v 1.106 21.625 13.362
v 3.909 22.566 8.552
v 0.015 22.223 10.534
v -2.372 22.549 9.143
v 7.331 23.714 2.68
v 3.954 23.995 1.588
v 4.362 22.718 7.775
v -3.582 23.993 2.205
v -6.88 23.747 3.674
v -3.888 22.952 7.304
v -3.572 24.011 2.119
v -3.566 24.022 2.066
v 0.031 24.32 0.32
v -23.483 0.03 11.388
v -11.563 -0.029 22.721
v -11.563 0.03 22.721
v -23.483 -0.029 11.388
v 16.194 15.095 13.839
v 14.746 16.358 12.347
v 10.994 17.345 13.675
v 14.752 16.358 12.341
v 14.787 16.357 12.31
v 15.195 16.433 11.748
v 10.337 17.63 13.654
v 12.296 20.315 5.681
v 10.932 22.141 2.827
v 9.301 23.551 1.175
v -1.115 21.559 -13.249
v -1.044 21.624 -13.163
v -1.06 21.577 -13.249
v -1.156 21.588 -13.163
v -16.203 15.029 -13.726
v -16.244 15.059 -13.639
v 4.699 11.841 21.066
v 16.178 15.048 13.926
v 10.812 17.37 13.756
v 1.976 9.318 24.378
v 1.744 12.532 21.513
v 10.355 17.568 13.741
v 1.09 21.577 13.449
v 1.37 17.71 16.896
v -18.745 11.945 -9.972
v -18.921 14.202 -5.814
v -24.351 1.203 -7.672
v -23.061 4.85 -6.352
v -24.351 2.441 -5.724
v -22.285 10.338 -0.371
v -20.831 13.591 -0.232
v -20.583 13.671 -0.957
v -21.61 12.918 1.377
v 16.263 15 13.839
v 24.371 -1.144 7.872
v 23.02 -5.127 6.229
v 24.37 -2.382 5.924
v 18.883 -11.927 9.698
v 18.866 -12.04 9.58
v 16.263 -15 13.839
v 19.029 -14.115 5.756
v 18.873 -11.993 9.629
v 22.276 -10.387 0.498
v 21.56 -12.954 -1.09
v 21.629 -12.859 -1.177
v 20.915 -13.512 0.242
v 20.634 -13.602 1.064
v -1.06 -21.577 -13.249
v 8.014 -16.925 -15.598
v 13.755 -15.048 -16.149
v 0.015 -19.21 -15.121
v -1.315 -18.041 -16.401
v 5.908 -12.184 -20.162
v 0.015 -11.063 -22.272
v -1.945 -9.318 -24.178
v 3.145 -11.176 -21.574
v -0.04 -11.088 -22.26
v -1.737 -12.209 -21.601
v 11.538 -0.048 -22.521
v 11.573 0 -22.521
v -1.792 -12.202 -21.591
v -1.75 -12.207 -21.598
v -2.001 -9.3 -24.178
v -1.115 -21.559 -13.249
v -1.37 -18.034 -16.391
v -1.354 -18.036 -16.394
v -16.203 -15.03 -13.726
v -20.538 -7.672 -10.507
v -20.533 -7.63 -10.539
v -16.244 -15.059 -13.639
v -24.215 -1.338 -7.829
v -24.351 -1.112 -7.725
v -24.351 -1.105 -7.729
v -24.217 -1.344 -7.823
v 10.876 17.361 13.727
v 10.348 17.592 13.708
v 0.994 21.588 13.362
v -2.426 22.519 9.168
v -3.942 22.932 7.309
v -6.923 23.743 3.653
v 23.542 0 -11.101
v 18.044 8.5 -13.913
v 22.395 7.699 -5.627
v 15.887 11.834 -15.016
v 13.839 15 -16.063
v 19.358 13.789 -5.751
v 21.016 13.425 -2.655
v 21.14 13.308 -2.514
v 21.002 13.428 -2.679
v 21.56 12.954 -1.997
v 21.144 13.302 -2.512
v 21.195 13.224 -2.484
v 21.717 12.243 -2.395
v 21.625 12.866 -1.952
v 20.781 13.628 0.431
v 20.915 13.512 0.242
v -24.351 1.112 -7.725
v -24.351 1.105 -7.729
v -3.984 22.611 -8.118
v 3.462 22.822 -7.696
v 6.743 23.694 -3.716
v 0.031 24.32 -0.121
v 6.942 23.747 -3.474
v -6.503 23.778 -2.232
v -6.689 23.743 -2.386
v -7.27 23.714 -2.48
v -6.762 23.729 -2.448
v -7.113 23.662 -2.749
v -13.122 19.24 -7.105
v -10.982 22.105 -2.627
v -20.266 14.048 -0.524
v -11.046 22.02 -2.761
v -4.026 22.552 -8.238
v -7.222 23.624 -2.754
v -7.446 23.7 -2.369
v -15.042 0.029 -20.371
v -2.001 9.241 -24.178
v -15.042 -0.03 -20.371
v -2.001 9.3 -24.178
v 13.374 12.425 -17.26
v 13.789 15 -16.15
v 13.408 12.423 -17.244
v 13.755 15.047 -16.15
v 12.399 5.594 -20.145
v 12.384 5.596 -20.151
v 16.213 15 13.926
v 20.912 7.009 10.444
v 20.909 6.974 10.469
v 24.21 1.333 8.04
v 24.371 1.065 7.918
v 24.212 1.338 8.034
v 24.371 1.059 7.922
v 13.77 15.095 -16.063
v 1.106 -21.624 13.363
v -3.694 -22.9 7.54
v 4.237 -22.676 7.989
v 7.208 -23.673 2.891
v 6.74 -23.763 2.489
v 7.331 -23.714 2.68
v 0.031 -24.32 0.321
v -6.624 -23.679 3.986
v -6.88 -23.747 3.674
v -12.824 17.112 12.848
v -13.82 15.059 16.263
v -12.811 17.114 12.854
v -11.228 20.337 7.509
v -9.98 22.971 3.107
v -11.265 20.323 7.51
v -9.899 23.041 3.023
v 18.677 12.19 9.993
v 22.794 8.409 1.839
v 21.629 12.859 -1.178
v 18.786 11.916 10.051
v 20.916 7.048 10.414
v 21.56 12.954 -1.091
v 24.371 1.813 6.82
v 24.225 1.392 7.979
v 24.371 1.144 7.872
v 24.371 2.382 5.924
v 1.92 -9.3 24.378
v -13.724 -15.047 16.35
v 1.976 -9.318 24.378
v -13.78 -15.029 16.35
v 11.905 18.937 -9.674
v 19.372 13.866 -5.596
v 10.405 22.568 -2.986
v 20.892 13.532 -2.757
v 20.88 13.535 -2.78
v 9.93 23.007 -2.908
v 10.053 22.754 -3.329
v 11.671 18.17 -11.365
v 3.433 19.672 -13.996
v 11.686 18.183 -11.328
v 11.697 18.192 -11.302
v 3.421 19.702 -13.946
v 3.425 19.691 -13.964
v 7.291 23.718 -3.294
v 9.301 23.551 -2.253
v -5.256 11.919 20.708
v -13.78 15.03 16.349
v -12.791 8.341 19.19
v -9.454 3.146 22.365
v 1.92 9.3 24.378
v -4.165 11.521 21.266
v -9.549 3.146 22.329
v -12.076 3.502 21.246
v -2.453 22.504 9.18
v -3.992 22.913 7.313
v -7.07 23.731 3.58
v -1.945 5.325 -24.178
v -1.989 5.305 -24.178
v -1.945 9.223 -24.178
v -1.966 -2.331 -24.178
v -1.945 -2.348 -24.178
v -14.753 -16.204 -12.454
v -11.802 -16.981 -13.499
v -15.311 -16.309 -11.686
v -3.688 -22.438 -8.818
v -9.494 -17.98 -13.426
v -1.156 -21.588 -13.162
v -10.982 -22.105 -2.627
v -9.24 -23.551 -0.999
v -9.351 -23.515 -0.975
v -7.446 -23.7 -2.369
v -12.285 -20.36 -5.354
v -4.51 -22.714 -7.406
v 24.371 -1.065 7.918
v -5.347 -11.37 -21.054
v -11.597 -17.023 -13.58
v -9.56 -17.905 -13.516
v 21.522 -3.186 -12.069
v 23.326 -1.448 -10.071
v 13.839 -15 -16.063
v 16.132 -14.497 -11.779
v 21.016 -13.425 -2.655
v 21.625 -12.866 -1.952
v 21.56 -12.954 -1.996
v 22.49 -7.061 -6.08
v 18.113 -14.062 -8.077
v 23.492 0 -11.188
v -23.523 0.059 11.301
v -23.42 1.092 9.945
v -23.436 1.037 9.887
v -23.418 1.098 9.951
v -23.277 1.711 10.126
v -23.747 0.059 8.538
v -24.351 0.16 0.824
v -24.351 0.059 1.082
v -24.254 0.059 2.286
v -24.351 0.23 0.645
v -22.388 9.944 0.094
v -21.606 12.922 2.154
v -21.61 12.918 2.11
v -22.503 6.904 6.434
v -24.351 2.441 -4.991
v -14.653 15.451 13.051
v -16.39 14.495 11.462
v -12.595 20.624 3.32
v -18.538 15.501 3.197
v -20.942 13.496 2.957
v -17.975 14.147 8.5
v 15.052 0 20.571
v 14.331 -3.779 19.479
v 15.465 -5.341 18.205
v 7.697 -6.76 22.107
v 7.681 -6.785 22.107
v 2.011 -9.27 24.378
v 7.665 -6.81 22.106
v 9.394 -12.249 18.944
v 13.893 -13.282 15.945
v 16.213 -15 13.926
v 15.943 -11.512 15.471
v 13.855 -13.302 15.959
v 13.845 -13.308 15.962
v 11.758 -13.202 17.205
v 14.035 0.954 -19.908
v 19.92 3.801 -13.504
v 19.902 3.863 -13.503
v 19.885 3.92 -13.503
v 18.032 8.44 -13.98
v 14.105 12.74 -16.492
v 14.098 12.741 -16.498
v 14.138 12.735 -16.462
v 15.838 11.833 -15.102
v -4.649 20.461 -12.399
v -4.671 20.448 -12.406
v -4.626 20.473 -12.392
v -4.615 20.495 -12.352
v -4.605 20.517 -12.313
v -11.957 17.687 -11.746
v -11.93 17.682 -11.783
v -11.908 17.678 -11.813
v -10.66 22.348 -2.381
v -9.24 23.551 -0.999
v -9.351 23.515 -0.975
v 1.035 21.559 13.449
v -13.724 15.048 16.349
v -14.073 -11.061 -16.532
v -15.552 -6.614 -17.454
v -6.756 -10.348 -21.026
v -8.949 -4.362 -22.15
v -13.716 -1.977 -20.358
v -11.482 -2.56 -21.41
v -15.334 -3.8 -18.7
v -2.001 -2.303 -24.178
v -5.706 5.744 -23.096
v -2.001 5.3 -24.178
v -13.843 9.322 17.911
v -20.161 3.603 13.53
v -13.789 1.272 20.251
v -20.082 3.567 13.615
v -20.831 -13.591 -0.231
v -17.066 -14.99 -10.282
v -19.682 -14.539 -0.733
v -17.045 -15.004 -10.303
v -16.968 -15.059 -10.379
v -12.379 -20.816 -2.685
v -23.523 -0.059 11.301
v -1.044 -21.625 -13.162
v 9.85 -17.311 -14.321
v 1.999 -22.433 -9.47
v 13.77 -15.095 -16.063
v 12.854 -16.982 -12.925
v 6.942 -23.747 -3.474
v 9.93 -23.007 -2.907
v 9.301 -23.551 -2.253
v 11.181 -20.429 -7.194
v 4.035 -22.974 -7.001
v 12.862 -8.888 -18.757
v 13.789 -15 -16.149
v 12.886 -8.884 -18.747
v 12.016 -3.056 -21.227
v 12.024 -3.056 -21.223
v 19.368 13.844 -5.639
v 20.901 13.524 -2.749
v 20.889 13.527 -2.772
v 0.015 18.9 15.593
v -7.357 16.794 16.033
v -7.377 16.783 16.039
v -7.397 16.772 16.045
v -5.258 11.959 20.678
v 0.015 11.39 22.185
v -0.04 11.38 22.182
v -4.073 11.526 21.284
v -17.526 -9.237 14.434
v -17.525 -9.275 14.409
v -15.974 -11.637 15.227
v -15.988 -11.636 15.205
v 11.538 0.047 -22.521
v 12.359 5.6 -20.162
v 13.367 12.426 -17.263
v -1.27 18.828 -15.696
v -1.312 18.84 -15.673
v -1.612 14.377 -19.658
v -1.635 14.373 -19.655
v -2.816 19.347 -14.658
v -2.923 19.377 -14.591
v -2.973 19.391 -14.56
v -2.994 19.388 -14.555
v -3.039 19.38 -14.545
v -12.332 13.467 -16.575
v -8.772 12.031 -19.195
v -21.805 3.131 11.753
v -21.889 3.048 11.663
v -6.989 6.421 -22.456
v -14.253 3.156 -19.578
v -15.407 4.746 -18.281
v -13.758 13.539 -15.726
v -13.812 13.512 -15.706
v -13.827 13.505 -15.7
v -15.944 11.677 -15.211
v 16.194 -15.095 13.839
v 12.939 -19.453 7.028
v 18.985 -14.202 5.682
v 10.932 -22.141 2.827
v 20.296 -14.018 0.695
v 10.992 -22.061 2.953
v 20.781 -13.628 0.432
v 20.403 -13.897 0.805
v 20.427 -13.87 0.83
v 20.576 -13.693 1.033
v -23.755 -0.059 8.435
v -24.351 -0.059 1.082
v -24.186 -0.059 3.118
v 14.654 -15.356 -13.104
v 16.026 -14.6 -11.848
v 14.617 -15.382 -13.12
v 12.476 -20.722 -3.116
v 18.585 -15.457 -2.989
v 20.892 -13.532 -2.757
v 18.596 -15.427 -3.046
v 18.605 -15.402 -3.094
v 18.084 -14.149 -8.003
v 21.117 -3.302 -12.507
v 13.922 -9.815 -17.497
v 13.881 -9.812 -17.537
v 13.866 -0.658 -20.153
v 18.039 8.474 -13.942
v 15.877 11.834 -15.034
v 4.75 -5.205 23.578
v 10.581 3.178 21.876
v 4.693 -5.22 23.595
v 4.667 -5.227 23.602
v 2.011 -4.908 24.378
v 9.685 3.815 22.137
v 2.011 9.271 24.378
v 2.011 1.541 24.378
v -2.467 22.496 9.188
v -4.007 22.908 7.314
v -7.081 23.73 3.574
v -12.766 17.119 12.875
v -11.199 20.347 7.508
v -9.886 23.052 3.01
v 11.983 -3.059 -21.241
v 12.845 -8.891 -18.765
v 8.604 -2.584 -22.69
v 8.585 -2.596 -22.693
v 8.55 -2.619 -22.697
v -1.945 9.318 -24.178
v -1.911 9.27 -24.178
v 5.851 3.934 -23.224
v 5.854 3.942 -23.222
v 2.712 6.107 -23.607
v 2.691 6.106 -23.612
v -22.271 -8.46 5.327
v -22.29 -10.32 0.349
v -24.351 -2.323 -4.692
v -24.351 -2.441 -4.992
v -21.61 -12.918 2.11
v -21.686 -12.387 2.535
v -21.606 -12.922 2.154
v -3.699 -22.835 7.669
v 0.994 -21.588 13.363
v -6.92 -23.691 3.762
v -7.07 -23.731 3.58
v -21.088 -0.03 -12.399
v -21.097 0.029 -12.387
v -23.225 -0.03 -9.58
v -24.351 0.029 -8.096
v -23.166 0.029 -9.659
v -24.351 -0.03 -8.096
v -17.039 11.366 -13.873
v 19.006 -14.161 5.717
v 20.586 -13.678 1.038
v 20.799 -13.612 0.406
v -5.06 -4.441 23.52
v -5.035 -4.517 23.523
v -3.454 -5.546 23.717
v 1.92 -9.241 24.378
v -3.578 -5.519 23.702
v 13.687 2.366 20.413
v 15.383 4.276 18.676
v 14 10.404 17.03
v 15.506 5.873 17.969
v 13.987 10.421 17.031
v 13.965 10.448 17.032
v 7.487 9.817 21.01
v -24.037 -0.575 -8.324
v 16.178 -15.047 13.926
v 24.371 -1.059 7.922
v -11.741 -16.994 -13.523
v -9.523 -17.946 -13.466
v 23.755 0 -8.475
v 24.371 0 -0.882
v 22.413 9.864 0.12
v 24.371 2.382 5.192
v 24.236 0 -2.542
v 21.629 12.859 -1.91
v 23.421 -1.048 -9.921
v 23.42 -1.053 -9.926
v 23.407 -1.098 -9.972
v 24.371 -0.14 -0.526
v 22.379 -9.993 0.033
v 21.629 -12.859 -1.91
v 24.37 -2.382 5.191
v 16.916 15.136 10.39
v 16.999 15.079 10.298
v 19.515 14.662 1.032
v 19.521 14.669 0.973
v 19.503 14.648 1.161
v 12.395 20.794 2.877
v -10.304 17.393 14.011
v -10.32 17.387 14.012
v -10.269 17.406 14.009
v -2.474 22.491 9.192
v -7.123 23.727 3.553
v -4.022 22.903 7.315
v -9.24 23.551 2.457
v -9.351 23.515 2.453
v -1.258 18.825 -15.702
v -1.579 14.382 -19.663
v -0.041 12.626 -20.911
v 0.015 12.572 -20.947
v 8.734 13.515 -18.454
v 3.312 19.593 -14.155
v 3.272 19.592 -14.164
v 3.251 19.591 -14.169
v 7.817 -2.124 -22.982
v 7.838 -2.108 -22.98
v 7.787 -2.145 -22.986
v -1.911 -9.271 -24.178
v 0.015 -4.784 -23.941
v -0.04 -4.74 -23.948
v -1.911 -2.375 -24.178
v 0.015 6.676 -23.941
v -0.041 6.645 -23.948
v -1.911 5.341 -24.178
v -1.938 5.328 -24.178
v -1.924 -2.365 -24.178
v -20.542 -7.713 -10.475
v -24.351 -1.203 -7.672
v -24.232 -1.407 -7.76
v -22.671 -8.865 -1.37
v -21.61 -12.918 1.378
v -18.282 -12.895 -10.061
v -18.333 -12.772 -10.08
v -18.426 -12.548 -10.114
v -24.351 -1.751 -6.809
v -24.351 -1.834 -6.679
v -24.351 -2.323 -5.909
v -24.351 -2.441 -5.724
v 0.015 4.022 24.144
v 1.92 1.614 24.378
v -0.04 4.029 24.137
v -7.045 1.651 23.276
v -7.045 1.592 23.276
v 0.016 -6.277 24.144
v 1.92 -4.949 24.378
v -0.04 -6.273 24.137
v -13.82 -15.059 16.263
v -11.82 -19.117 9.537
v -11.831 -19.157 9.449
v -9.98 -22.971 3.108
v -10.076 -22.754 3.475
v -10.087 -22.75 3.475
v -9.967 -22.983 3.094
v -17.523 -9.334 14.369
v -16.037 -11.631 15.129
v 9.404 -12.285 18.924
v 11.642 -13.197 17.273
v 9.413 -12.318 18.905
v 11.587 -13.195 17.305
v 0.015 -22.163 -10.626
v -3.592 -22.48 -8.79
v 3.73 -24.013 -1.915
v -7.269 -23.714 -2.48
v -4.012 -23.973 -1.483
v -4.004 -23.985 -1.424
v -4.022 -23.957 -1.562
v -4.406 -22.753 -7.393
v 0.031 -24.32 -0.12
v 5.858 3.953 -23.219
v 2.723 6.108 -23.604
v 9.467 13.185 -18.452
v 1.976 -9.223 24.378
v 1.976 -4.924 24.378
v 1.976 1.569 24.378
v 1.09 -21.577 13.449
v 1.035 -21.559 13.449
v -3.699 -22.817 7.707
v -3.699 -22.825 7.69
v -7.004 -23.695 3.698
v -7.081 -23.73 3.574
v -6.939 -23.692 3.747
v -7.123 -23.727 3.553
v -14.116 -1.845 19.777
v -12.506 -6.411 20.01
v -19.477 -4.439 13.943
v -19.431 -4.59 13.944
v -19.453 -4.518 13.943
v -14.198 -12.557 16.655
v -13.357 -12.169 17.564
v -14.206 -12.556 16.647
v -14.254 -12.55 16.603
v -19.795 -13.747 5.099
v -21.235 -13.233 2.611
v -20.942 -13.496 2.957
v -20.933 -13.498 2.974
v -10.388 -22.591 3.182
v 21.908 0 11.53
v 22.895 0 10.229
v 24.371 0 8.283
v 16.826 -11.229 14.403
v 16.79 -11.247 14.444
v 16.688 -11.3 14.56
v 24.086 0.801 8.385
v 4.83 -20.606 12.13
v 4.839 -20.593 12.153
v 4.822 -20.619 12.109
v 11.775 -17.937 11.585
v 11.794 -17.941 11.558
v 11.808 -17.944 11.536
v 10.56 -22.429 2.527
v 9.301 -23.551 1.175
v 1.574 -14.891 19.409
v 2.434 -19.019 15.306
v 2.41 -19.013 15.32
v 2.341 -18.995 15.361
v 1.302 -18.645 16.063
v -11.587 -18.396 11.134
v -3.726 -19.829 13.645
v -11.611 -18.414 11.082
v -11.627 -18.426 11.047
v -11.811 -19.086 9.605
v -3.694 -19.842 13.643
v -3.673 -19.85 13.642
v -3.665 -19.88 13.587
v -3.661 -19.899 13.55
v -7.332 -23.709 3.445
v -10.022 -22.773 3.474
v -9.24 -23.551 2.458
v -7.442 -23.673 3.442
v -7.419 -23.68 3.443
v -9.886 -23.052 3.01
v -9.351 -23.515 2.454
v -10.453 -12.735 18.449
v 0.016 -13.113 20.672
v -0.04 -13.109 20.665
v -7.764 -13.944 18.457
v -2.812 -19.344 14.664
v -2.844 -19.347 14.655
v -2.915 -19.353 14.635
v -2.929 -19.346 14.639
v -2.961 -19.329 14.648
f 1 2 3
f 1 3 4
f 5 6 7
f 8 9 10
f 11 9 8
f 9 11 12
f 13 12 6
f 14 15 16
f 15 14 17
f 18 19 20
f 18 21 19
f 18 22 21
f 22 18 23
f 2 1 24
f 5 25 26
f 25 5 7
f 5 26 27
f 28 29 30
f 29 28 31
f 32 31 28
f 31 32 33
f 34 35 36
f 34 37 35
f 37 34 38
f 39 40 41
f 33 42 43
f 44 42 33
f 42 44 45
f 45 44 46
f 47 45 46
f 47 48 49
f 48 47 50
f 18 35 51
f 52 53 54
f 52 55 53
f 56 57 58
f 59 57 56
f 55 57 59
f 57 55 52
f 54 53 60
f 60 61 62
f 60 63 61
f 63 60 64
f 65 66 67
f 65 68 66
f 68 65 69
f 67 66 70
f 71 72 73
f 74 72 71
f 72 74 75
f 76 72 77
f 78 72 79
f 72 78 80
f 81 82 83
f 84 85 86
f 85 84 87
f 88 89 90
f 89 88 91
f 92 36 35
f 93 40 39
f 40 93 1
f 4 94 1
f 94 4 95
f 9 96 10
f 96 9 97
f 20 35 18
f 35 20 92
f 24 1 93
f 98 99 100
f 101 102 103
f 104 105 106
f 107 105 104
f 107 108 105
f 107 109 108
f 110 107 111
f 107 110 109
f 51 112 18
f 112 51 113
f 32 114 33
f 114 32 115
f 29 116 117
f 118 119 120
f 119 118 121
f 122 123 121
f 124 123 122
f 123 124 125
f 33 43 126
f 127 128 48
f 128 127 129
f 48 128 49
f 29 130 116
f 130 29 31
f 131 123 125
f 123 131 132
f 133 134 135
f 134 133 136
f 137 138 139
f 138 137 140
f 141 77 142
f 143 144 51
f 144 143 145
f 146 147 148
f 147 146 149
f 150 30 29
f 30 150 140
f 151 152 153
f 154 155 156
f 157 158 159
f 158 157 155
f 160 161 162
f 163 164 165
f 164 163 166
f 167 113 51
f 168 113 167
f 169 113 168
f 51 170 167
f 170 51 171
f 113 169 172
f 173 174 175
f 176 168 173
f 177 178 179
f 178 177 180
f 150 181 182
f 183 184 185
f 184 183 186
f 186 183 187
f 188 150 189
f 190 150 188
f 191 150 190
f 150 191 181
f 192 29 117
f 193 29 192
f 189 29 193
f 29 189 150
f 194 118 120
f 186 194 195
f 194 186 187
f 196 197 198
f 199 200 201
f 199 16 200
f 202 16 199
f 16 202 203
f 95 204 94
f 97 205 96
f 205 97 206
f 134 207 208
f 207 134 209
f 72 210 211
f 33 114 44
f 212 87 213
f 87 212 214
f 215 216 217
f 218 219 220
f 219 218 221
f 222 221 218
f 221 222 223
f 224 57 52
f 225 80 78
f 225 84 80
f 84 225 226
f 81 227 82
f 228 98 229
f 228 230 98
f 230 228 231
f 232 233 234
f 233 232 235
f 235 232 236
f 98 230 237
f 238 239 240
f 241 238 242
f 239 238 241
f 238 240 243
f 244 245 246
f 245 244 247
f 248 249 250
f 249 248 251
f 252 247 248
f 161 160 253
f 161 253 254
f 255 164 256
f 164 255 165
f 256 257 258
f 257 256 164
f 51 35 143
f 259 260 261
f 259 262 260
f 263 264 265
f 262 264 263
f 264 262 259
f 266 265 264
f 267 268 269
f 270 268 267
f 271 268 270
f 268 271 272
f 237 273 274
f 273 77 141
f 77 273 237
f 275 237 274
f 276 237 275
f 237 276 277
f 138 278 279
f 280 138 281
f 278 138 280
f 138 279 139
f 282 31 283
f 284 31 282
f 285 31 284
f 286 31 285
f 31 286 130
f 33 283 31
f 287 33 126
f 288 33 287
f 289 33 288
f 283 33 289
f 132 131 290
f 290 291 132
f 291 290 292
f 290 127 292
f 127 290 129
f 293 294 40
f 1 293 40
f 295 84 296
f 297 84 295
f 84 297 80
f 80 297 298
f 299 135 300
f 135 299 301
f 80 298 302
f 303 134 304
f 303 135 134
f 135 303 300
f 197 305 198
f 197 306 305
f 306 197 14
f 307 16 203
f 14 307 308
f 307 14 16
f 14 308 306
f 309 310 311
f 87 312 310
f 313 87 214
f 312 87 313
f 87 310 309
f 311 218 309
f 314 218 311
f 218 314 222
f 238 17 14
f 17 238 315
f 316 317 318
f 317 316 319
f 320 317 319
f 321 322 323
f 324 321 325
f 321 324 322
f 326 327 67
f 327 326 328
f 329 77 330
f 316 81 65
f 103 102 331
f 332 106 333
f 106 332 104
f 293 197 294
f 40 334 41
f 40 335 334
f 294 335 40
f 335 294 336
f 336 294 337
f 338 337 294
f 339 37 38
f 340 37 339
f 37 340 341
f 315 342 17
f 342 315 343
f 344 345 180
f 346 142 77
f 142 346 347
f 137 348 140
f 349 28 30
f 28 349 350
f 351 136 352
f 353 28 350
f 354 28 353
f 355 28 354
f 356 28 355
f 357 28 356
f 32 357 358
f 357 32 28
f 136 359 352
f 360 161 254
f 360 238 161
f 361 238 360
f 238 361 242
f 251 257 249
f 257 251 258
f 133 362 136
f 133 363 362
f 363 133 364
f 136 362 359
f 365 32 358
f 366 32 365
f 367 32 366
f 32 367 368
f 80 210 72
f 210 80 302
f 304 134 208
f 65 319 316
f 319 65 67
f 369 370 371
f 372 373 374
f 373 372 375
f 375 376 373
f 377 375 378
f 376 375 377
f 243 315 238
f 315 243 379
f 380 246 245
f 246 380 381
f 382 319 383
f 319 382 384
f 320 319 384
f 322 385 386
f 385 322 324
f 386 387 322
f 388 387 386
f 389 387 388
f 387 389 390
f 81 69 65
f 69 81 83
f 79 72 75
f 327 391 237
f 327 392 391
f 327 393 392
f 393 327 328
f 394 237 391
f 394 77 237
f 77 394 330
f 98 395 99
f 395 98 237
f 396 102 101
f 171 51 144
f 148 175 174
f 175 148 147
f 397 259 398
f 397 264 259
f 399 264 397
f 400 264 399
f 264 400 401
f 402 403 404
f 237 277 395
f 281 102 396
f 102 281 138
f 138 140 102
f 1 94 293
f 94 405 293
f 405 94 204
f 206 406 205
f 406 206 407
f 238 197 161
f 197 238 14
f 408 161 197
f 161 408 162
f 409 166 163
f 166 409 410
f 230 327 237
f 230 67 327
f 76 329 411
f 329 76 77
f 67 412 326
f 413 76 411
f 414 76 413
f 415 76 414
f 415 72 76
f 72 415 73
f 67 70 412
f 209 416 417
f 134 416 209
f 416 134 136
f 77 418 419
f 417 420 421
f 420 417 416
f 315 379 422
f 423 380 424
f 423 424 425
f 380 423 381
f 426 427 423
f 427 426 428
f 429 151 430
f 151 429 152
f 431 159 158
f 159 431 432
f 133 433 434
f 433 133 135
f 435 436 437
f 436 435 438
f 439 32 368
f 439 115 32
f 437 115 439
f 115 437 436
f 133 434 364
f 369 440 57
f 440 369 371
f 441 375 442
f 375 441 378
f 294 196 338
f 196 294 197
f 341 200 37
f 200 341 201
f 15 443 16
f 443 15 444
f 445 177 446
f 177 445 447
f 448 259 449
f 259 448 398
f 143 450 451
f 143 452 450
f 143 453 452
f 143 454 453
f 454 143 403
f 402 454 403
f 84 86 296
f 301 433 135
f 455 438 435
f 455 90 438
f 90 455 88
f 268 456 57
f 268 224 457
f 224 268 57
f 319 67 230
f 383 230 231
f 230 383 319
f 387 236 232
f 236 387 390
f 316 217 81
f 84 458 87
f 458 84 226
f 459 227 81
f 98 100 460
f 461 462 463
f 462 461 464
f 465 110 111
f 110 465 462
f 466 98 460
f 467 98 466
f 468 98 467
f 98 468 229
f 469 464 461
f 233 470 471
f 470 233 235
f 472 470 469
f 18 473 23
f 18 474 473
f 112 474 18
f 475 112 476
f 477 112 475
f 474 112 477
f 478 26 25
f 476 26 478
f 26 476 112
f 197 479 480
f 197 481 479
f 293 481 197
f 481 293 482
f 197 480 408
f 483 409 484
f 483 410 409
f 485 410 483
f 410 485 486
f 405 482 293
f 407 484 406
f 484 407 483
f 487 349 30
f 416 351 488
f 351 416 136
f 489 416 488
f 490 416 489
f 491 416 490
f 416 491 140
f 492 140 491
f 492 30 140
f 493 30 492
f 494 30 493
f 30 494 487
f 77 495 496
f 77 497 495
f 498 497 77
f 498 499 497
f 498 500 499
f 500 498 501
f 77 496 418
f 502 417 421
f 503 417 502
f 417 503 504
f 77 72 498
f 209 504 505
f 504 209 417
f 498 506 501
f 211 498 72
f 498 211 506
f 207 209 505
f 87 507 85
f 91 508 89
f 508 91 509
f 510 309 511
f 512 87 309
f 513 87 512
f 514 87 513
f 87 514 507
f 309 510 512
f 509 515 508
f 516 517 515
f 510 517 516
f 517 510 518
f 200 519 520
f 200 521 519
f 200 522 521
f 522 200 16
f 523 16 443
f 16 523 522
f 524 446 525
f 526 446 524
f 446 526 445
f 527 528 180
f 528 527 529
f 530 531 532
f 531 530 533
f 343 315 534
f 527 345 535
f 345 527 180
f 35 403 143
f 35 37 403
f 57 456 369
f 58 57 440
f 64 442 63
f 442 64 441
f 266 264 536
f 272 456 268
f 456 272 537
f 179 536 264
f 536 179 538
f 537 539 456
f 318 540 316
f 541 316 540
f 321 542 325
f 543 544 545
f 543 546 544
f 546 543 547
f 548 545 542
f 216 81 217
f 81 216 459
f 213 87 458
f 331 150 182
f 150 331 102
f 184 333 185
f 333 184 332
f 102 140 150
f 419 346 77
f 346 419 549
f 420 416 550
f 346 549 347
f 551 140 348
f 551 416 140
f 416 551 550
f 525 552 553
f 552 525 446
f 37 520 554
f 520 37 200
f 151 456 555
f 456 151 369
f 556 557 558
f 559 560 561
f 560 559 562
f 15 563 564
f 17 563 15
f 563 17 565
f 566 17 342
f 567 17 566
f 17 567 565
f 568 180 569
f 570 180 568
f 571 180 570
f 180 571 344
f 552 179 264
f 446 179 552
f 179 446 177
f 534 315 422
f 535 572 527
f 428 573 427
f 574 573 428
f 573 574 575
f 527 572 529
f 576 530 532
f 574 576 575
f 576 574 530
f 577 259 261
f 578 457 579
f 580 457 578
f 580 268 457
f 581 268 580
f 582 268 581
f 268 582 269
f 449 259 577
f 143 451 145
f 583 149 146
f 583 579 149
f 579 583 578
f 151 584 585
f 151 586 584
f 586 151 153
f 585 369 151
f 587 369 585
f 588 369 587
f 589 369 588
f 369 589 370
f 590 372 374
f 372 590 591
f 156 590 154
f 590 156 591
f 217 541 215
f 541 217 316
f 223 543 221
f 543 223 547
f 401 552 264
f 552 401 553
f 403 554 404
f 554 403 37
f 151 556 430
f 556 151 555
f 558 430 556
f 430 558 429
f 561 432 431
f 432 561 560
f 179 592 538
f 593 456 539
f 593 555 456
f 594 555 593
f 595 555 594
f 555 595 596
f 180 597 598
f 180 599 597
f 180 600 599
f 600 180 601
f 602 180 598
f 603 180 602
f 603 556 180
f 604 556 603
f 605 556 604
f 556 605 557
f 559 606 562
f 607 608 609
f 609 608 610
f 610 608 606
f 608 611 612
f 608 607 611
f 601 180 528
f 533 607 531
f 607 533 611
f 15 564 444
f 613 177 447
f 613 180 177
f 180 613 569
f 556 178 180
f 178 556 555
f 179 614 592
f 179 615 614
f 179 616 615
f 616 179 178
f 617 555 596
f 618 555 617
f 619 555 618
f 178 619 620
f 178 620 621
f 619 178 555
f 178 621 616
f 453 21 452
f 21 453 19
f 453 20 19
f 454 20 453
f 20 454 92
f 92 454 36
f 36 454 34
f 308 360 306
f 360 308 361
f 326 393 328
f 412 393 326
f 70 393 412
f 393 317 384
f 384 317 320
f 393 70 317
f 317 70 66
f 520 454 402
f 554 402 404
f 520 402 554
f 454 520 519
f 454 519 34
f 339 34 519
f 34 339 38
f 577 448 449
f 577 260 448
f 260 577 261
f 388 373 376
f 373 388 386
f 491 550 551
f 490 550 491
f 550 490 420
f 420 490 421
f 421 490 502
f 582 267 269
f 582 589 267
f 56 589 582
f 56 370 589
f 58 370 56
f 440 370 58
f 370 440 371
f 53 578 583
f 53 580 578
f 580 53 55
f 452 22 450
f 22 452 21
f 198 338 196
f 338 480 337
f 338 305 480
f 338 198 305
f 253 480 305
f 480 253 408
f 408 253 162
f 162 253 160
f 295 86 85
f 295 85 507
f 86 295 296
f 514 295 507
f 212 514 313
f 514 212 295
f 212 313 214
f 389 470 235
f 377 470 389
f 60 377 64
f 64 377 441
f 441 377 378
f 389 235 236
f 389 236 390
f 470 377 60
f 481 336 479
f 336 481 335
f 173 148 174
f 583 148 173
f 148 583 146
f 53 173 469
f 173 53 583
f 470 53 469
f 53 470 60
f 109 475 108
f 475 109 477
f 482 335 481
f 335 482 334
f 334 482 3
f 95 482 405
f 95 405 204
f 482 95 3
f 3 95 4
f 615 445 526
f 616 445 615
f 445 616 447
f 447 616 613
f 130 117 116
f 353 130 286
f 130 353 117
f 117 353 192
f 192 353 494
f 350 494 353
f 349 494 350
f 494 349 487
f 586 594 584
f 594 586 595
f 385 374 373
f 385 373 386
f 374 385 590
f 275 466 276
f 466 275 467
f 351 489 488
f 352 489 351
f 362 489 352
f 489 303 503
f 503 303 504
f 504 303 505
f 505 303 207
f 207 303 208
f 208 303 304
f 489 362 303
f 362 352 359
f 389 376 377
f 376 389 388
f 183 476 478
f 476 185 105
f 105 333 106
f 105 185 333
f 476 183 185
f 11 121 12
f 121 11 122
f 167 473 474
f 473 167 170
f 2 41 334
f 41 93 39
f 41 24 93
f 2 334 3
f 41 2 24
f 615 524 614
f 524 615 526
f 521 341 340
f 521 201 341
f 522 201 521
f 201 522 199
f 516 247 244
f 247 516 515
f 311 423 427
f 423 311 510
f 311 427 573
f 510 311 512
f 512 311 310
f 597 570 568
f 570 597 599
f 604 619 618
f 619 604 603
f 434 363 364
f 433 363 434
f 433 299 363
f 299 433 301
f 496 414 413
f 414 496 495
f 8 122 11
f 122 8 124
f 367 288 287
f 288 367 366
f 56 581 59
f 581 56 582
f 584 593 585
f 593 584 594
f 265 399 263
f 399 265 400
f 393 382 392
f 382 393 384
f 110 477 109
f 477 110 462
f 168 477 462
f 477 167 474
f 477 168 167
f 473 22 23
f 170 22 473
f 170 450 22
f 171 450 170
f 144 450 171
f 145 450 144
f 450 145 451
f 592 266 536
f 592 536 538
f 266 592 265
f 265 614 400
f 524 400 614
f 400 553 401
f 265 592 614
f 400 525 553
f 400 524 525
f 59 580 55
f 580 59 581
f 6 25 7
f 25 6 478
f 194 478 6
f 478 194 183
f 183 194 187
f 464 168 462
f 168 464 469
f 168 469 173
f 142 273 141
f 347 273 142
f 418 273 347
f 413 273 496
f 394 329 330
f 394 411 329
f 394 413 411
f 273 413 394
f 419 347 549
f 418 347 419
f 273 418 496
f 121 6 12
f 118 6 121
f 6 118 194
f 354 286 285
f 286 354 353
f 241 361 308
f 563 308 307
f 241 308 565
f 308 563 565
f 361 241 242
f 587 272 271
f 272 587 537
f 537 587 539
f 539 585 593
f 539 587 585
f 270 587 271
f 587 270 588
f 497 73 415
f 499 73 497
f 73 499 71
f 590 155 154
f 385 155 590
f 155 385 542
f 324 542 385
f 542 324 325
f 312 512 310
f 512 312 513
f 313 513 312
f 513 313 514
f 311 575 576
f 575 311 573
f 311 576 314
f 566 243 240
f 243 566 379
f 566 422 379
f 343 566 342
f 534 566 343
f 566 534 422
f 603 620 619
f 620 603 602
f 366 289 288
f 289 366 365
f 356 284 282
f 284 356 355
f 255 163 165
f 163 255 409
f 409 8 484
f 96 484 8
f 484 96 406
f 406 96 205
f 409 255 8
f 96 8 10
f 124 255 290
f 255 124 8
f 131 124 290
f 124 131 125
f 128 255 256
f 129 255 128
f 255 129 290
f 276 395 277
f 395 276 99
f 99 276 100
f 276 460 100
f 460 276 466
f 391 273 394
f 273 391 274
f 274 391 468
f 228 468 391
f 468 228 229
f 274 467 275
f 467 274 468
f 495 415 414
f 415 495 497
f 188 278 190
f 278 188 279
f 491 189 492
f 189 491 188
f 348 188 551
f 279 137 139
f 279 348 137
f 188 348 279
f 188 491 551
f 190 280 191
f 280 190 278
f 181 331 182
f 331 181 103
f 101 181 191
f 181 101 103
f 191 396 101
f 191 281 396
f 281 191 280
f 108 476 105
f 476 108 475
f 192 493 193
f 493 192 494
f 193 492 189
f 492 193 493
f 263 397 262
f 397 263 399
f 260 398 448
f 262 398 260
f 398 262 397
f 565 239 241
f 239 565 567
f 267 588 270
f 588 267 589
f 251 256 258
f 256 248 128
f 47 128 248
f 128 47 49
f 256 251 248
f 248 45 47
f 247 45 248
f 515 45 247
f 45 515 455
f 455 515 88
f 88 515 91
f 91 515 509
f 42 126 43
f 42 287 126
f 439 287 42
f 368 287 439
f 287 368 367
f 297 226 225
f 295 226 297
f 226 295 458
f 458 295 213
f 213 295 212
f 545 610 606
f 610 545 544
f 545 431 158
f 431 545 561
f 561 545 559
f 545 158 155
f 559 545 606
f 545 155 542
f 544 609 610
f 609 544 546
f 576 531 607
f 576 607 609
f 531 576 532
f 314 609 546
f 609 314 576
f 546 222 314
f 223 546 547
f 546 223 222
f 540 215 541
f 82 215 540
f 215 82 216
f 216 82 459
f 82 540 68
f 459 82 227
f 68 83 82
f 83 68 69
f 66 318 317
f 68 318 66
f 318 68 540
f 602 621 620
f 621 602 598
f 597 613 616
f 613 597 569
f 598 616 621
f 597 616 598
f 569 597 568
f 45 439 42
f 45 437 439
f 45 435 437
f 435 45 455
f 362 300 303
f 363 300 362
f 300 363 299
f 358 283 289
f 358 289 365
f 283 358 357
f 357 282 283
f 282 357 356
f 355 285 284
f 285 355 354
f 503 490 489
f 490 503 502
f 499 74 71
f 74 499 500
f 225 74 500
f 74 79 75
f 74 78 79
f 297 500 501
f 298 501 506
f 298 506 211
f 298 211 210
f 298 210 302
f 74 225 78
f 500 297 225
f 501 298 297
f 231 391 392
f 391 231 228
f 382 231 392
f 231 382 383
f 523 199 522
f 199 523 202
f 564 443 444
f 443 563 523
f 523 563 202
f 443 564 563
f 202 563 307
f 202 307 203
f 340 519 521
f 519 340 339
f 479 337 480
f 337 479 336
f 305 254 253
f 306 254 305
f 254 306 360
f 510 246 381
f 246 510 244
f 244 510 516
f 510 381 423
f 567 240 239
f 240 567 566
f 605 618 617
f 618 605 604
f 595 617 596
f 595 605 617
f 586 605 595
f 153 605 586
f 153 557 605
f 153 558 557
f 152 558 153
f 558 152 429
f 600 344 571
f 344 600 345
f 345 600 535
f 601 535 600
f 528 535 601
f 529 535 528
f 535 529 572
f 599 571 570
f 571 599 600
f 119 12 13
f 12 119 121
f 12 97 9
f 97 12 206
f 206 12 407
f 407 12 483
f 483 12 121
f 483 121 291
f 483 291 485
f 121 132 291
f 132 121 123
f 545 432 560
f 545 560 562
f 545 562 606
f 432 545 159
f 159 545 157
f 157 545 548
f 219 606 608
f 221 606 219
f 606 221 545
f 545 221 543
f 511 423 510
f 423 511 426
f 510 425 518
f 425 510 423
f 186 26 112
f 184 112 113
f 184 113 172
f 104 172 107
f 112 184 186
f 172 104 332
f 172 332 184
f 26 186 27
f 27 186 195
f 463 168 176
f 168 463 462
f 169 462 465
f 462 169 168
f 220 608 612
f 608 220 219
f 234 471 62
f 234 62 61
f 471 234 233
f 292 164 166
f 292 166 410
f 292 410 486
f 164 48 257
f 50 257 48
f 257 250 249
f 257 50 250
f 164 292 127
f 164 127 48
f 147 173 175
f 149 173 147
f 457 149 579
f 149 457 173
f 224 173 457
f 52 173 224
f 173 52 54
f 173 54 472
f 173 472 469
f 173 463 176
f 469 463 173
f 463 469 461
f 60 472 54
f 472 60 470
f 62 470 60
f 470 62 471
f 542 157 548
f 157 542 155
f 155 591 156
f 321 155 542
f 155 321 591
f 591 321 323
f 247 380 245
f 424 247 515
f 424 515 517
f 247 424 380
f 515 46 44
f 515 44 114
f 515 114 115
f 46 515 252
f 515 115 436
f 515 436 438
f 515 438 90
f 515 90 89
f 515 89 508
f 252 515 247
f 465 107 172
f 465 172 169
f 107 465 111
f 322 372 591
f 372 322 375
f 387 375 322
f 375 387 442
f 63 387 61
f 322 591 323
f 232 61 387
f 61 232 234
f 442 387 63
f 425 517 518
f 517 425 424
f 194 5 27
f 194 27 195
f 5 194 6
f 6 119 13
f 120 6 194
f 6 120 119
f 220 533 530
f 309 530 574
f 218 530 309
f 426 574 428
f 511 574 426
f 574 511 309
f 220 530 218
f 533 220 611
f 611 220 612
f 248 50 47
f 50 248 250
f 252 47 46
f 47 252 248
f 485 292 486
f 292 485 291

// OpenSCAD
// Auto-generated OpenSCAD file

    shift = 0.1;

    inner_points = 10*[[5.706443019642959e-06, -0.2723516987986492, 2.5837617057555686], [1.4999954393425396, 1.0642537474213205, -1.8350415916407063], [-1.4999954393425396, -1.0642537474213205, 1.8350415916407063], [-5.706443019642959e-06, 0.2723516987986492, -2.5837617057555686], [0.9270536898503097, -2.3455753471556426, 0.6235765766532704], [1.4999987850420502, -1.8350374962478342, -1.0642560933519971], [-1.4999987850420502, 1.8350374962478342, 1.0642560933519971], [-0.9270536898503097, 2.3455753471556426, -0.6235765766532704], [2.4270527678798555, 0.2381872333395192, 0.8959250547901861], [-1.5000012149505249, -1.8350392457153057, -1.0642496520232227], [1.5000012149505249, 1.8350392457153057, 1.0642496520232227], [-2.4270527678798555, -0.2381872333395192, -0.8959250547901861], [4.962674139297185e-06, -1.7387961310994404, 1.8390700989324391], [1.330582852496041, -0.5531495795607023, -2.0806647086000423], [-1.330582852496041, 0.5531495795607023, 2.0806647086000423], [-4.962674139297185e-06, 1.7387961310994404, -1.8390700989324391], [2.1529364705869334, -1.285918487941708, 0.3418610979985478], [-1.6062511876135943e-07, -2.4225275722759347, -0.7327693879394935], [1.6062511876135943e-07, 2.4225275722759347, 0.7327693879394935], [-2.1529364705869334, 1.285918487941708, -0.3418610979985478], [1.330591142168375, 0.5531511314398159, 2.080658994767834], [2.1529335027574232, 1.2859209989348601, -0.3418703431732669], [-2.1529335027574232, -1.2859209989348601, 0.3418703431732669], [-1.330591142168375, -0.5531511314398159, -2.080658994767834], [1.5000045606500354, -1.0642519979538485, 1.8350351503119327], [2.427049198357815, -0.2381844026416876, -0.8959354770790755], [-0.9270482763947859, -2.345576428386003, 0.6235805576133857], [-3.638687006146668e-06, -1.519508833073842, -2.1073900697776224], [3.638687006146668e-06, 1.519508833073842, 2.1073900697776224], [0.9270482763947859, 2.345576428386003, -0.6235805576133857], [-2.427049198357815, 0.2381844026416876, 0.8959354770790755], [-1.5000045606500354, 1.0642519979538485, -1.8350351503119327]];

    outer_points_unshifted = 10*[[-0.19608520439314178, -0.9270801333840294, -2.4191058304470165], [0.19608700353766162, -0.9270218327319238, 2.4191280265173996], [-0.19608700353766162, 0.9270218327319238, -2.4191280265173996], [0.19608520439314178, 0.9270801333840294, 2.4191058304470165], [2.344218701663454, -1.1134433769019005e-05, -1.1201065478994996], [2.4940151556499304, 1.1134433769019005e-05, 0.7279343399404099], [-2.4940151556499304, -1.1134433769019005e-05, -0.7279343399404099], [-2.344218701663454, 1.1134433769019005e-05, 1.1201065478994996], [0.9240227990973536, -2.427050982949786, -0.0748691719653011], [0.9240180888758501, 2.427050982949786, -0.0749272820319791], [-0.9240180888758501, -2.427050982949786, 0.0749272820319791], [-0.9240227990973536, 2.427050982949786, 0.0748691719653011], [1.1522975479796653, -2.5858029875943017e-05, -2.253397695612072], [1.5001770417057199, 2.5858029875943017e-05, 2.0383963444847573], [-1.5001770417057199, -2.5858029875943017e-05, -2.0383963444847573], [-1.1522975479796653, 2.5858029875943017e-05, 2.253397695612072], [2.145898311350253, -1.33058699723953, -0.1739238179767419], [2.1458957290561314, 1.33058699723953, -0.17395567577440402], [-2.1458957290561314, -1.33058699723953, 0.17395567577440402], [-2.145898311350253, 1.33058699723953, 0.1739238179767419], [-0.10749858643607466, -2.152950967663567, -1.3262115212473227], [0.10750276467573276, -2.1529190053808764, 1.326263068246747], [-0.10750276467573276, 2.1529190053808764, -1.326263068246747], [0.10749858643607466, 2.152950967663567, 1.3262115212473227], [1.3739100632364183, -1.500018015784093, -1.61626640454501], [1.616285817180746, -1.4999819839995254, 1.3739265645794962], [1.3739071521594346, 1.4999819839995254, -1.6163023185413057], [1.6162829061037622, 1.500018015784093, 1.3738906505832005], [-1.6162829061037622, -1.500018015784093, -1.3738906505832005], [-1.3739071521594346, -1.4999819839995254, 1.6163023185413057], [-1.616285817180746, 1.4999819839995254, -1.3739265645794962], [-1.3739100632364183, 1.500018015784093, 1.61626640454501]];
    
    outer_points = [for (p = outer_points_unshifted) [p[0], p[1], p[2] + shift]];

    // Convex hull for inner set (I)
    module inner_hull() {
        hull() {
            for (p = inner_points) {
                translate(p) sphere(r=0.1);
            }
        }
    }

    // Convex hull for outer set (O) minus inner hull (O \ I)
    module outer_minus_inner() {
        difference() {
            hull() {
                for (p = outer_points) {
                    translate(p) sphere(r=0.1);
                }
            }
            inner_hull(); // Subtract inner hull
        }
    }

    // Convex hull for outer set (O) minus all translated inner hulls
    module outer_minus_AllTranslationInner() {
        difference() {
            hull() {
                for (p = outer_points) {
                    translate(p) sphere(r=0.1);
                }
            }
            hull() {
                translate([0,0,50]) inner_hull();
                translate([0,0,-50]) inner_hull();
            }; // Subtract translated inner hulls
        }
    }

    // Difference between outer_minus_inner and outer_minus_AllTranslationInner
    module outer_minus_inner_diff() {
        difference() {
            // Outer minus inner
            difference() {
                hull() {
                    for (p = outer_points) {
                        translate(p) sphere(r=0.1);
                    }
                }
                inner_hull();
            }

            // Subtract Outer minus AllTranslationInner
            difference() {
                hull() {
                    for (p = outer_points) {
                        translate(p) sphere(r=0.1);
                    }
                }
                hull() {
                    translate([0,0,50]) inner_hull();
                    translate([0,0,-50]) inner_hull();
                };
            }
        }
    }

    // Rendering all with colors applied
    // color([1, 0, 0, 0.5]) inner_hull(); // Transparent red
    // color([0, 0, 1, 1]) outer_minus_inner(); // Opaque blue
    color([1, 1, 0, 1]) outer_minus_inner_diff(); // Opaque yellow
    
